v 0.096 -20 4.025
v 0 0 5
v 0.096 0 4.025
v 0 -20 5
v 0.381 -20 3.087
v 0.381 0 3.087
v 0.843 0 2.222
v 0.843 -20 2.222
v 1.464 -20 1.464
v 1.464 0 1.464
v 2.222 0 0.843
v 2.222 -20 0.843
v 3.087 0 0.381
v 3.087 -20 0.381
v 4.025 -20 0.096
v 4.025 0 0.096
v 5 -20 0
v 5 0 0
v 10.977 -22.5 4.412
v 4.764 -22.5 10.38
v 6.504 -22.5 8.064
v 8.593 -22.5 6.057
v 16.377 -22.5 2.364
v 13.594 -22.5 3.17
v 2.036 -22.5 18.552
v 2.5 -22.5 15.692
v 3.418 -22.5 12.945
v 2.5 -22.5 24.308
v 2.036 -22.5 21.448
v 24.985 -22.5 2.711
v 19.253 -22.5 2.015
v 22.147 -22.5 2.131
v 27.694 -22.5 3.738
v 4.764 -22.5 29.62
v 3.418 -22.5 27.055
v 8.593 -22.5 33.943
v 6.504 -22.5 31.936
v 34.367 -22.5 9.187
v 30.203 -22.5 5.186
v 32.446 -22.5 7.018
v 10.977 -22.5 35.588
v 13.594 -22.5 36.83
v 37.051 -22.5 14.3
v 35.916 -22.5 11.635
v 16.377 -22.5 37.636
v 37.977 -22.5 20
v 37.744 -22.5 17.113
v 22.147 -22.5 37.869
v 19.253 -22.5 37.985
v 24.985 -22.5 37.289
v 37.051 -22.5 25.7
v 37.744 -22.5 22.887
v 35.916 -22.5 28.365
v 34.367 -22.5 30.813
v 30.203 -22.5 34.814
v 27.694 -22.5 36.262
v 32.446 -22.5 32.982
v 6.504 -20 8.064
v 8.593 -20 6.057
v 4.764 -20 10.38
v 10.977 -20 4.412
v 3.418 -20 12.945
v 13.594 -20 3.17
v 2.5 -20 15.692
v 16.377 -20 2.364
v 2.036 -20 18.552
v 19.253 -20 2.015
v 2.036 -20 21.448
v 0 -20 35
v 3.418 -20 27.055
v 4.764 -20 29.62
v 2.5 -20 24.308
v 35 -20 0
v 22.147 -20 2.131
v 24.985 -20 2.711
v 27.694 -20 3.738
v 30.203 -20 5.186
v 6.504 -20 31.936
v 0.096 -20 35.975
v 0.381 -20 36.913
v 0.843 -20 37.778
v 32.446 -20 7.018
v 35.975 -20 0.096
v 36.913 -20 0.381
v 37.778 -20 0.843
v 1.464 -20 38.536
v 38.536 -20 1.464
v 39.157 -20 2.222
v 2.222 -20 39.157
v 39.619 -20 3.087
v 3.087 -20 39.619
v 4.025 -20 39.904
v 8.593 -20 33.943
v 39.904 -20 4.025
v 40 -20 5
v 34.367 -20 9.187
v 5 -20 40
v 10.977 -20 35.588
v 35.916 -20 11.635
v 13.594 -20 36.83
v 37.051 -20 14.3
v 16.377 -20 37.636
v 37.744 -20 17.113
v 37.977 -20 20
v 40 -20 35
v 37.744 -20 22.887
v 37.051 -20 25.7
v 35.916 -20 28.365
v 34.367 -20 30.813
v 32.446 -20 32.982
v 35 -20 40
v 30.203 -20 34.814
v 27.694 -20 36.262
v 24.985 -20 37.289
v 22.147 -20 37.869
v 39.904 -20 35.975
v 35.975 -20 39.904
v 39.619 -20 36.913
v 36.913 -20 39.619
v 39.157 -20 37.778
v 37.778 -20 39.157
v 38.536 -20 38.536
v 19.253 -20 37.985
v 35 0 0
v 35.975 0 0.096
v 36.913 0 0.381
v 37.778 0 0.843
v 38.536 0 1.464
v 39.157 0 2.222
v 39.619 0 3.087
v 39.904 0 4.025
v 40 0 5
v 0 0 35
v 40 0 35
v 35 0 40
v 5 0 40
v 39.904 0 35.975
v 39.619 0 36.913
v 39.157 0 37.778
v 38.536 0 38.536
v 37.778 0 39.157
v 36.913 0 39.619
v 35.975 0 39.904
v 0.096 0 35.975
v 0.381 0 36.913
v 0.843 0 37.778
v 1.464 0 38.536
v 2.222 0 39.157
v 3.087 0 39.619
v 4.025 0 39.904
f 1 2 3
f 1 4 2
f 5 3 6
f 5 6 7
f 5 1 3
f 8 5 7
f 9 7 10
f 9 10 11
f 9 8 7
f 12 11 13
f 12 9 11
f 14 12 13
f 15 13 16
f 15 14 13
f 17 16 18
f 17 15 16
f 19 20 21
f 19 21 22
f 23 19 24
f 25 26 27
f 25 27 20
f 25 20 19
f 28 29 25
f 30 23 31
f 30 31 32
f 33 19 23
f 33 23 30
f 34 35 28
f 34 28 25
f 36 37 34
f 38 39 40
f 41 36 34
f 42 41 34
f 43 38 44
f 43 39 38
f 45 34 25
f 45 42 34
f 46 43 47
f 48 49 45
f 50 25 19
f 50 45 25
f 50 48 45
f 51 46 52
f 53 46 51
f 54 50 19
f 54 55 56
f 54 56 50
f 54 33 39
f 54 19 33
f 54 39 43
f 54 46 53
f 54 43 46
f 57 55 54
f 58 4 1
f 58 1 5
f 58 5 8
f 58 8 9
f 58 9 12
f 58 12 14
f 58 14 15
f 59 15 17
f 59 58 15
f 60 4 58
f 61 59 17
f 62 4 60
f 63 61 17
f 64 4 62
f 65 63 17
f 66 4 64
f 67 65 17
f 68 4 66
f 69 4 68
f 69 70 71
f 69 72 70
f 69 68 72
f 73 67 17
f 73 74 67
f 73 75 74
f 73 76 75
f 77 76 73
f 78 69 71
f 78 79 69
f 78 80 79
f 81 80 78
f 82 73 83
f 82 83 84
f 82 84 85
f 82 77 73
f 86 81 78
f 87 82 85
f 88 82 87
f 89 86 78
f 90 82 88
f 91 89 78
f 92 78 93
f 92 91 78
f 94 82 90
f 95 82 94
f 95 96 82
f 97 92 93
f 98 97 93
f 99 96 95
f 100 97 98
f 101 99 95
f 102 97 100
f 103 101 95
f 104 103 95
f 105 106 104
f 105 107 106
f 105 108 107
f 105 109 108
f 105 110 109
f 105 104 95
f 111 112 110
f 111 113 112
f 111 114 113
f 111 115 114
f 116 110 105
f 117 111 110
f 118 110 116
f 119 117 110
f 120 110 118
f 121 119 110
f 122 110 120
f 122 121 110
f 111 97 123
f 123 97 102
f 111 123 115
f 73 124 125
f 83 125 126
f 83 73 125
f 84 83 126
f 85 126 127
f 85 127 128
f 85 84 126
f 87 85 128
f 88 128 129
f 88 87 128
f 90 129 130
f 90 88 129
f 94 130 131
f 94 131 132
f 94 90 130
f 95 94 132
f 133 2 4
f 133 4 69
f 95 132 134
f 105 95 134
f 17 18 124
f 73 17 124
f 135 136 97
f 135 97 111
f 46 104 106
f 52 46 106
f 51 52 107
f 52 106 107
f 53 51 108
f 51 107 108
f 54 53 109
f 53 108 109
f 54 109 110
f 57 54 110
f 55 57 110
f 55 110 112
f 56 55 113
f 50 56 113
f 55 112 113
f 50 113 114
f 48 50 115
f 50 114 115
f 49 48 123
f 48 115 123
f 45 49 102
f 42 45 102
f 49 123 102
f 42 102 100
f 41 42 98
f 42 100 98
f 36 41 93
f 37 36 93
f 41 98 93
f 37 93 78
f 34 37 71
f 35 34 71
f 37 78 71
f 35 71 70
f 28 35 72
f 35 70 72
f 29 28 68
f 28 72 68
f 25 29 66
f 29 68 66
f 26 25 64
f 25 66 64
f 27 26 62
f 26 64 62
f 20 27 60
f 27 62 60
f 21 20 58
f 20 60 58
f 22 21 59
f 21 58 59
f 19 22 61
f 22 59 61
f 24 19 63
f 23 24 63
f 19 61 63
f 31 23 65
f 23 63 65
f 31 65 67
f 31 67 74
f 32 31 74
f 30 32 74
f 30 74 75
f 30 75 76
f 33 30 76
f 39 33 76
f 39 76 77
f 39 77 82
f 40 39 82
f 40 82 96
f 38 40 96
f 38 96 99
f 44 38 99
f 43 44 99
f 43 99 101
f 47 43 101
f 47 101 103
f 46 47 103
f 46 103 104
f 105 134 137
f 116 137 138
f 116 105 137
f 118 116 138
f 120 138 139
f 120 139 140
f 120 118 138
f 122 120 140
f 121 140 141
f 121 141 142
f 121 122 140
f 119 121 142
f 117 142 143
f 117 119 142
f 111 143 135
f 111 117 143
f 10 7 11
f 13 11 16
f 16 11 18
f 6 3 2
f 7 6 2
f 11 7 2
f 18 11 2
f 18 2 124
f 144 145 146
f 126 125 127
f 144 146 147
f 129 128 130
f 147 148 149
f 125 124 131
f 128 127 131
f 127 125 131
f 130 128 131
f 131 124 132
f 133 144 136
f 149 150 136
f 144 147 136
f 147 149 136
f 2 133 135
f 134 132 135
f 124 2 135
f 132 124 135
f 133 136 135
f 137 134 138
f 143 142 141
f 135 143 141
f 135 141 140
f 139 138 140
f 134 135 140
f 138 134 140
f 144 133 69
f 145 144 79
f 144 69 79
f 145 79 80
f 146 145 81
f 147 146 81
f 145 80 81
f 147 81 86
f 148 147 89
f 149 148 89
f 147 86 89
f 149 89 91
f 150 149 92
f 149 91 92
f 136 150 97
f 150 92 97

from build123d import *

# Parameters (mm, degrees)
F0_W     = 40
F0_H     = 40
F1_DEPTH = 20
F2_R     = 5
F3_R     = 18
F4_DEPTH = 2.5


with BuildPart() as f1:
    # F0 (on Front) → F1 (new body)
    with BuildSketch(Plane.XZ):
        with Locations((20, 20)):
            Rectangle(F0_W, F0_H)
    extrude(amount=F1_DEPTH)

    # F2
    f2_edges = [f1.edges().sort_by_distance(p)[0] for p in [
        (0, -10, 40),
        (40, -10, 40),
        (0, -10, 0),
        (40, -10, 0),
    ]]
    fillet(f2_edges, radius=F2_R)

    # F3 (on face) → F4 (join)
    with BuildSketch(Plane.XZ.offset(20)):
        with Locations((19.97735, 20)):
            Circle(F3_R)
    extrude(amount=F4_DEPTH)


solid = f1.part
